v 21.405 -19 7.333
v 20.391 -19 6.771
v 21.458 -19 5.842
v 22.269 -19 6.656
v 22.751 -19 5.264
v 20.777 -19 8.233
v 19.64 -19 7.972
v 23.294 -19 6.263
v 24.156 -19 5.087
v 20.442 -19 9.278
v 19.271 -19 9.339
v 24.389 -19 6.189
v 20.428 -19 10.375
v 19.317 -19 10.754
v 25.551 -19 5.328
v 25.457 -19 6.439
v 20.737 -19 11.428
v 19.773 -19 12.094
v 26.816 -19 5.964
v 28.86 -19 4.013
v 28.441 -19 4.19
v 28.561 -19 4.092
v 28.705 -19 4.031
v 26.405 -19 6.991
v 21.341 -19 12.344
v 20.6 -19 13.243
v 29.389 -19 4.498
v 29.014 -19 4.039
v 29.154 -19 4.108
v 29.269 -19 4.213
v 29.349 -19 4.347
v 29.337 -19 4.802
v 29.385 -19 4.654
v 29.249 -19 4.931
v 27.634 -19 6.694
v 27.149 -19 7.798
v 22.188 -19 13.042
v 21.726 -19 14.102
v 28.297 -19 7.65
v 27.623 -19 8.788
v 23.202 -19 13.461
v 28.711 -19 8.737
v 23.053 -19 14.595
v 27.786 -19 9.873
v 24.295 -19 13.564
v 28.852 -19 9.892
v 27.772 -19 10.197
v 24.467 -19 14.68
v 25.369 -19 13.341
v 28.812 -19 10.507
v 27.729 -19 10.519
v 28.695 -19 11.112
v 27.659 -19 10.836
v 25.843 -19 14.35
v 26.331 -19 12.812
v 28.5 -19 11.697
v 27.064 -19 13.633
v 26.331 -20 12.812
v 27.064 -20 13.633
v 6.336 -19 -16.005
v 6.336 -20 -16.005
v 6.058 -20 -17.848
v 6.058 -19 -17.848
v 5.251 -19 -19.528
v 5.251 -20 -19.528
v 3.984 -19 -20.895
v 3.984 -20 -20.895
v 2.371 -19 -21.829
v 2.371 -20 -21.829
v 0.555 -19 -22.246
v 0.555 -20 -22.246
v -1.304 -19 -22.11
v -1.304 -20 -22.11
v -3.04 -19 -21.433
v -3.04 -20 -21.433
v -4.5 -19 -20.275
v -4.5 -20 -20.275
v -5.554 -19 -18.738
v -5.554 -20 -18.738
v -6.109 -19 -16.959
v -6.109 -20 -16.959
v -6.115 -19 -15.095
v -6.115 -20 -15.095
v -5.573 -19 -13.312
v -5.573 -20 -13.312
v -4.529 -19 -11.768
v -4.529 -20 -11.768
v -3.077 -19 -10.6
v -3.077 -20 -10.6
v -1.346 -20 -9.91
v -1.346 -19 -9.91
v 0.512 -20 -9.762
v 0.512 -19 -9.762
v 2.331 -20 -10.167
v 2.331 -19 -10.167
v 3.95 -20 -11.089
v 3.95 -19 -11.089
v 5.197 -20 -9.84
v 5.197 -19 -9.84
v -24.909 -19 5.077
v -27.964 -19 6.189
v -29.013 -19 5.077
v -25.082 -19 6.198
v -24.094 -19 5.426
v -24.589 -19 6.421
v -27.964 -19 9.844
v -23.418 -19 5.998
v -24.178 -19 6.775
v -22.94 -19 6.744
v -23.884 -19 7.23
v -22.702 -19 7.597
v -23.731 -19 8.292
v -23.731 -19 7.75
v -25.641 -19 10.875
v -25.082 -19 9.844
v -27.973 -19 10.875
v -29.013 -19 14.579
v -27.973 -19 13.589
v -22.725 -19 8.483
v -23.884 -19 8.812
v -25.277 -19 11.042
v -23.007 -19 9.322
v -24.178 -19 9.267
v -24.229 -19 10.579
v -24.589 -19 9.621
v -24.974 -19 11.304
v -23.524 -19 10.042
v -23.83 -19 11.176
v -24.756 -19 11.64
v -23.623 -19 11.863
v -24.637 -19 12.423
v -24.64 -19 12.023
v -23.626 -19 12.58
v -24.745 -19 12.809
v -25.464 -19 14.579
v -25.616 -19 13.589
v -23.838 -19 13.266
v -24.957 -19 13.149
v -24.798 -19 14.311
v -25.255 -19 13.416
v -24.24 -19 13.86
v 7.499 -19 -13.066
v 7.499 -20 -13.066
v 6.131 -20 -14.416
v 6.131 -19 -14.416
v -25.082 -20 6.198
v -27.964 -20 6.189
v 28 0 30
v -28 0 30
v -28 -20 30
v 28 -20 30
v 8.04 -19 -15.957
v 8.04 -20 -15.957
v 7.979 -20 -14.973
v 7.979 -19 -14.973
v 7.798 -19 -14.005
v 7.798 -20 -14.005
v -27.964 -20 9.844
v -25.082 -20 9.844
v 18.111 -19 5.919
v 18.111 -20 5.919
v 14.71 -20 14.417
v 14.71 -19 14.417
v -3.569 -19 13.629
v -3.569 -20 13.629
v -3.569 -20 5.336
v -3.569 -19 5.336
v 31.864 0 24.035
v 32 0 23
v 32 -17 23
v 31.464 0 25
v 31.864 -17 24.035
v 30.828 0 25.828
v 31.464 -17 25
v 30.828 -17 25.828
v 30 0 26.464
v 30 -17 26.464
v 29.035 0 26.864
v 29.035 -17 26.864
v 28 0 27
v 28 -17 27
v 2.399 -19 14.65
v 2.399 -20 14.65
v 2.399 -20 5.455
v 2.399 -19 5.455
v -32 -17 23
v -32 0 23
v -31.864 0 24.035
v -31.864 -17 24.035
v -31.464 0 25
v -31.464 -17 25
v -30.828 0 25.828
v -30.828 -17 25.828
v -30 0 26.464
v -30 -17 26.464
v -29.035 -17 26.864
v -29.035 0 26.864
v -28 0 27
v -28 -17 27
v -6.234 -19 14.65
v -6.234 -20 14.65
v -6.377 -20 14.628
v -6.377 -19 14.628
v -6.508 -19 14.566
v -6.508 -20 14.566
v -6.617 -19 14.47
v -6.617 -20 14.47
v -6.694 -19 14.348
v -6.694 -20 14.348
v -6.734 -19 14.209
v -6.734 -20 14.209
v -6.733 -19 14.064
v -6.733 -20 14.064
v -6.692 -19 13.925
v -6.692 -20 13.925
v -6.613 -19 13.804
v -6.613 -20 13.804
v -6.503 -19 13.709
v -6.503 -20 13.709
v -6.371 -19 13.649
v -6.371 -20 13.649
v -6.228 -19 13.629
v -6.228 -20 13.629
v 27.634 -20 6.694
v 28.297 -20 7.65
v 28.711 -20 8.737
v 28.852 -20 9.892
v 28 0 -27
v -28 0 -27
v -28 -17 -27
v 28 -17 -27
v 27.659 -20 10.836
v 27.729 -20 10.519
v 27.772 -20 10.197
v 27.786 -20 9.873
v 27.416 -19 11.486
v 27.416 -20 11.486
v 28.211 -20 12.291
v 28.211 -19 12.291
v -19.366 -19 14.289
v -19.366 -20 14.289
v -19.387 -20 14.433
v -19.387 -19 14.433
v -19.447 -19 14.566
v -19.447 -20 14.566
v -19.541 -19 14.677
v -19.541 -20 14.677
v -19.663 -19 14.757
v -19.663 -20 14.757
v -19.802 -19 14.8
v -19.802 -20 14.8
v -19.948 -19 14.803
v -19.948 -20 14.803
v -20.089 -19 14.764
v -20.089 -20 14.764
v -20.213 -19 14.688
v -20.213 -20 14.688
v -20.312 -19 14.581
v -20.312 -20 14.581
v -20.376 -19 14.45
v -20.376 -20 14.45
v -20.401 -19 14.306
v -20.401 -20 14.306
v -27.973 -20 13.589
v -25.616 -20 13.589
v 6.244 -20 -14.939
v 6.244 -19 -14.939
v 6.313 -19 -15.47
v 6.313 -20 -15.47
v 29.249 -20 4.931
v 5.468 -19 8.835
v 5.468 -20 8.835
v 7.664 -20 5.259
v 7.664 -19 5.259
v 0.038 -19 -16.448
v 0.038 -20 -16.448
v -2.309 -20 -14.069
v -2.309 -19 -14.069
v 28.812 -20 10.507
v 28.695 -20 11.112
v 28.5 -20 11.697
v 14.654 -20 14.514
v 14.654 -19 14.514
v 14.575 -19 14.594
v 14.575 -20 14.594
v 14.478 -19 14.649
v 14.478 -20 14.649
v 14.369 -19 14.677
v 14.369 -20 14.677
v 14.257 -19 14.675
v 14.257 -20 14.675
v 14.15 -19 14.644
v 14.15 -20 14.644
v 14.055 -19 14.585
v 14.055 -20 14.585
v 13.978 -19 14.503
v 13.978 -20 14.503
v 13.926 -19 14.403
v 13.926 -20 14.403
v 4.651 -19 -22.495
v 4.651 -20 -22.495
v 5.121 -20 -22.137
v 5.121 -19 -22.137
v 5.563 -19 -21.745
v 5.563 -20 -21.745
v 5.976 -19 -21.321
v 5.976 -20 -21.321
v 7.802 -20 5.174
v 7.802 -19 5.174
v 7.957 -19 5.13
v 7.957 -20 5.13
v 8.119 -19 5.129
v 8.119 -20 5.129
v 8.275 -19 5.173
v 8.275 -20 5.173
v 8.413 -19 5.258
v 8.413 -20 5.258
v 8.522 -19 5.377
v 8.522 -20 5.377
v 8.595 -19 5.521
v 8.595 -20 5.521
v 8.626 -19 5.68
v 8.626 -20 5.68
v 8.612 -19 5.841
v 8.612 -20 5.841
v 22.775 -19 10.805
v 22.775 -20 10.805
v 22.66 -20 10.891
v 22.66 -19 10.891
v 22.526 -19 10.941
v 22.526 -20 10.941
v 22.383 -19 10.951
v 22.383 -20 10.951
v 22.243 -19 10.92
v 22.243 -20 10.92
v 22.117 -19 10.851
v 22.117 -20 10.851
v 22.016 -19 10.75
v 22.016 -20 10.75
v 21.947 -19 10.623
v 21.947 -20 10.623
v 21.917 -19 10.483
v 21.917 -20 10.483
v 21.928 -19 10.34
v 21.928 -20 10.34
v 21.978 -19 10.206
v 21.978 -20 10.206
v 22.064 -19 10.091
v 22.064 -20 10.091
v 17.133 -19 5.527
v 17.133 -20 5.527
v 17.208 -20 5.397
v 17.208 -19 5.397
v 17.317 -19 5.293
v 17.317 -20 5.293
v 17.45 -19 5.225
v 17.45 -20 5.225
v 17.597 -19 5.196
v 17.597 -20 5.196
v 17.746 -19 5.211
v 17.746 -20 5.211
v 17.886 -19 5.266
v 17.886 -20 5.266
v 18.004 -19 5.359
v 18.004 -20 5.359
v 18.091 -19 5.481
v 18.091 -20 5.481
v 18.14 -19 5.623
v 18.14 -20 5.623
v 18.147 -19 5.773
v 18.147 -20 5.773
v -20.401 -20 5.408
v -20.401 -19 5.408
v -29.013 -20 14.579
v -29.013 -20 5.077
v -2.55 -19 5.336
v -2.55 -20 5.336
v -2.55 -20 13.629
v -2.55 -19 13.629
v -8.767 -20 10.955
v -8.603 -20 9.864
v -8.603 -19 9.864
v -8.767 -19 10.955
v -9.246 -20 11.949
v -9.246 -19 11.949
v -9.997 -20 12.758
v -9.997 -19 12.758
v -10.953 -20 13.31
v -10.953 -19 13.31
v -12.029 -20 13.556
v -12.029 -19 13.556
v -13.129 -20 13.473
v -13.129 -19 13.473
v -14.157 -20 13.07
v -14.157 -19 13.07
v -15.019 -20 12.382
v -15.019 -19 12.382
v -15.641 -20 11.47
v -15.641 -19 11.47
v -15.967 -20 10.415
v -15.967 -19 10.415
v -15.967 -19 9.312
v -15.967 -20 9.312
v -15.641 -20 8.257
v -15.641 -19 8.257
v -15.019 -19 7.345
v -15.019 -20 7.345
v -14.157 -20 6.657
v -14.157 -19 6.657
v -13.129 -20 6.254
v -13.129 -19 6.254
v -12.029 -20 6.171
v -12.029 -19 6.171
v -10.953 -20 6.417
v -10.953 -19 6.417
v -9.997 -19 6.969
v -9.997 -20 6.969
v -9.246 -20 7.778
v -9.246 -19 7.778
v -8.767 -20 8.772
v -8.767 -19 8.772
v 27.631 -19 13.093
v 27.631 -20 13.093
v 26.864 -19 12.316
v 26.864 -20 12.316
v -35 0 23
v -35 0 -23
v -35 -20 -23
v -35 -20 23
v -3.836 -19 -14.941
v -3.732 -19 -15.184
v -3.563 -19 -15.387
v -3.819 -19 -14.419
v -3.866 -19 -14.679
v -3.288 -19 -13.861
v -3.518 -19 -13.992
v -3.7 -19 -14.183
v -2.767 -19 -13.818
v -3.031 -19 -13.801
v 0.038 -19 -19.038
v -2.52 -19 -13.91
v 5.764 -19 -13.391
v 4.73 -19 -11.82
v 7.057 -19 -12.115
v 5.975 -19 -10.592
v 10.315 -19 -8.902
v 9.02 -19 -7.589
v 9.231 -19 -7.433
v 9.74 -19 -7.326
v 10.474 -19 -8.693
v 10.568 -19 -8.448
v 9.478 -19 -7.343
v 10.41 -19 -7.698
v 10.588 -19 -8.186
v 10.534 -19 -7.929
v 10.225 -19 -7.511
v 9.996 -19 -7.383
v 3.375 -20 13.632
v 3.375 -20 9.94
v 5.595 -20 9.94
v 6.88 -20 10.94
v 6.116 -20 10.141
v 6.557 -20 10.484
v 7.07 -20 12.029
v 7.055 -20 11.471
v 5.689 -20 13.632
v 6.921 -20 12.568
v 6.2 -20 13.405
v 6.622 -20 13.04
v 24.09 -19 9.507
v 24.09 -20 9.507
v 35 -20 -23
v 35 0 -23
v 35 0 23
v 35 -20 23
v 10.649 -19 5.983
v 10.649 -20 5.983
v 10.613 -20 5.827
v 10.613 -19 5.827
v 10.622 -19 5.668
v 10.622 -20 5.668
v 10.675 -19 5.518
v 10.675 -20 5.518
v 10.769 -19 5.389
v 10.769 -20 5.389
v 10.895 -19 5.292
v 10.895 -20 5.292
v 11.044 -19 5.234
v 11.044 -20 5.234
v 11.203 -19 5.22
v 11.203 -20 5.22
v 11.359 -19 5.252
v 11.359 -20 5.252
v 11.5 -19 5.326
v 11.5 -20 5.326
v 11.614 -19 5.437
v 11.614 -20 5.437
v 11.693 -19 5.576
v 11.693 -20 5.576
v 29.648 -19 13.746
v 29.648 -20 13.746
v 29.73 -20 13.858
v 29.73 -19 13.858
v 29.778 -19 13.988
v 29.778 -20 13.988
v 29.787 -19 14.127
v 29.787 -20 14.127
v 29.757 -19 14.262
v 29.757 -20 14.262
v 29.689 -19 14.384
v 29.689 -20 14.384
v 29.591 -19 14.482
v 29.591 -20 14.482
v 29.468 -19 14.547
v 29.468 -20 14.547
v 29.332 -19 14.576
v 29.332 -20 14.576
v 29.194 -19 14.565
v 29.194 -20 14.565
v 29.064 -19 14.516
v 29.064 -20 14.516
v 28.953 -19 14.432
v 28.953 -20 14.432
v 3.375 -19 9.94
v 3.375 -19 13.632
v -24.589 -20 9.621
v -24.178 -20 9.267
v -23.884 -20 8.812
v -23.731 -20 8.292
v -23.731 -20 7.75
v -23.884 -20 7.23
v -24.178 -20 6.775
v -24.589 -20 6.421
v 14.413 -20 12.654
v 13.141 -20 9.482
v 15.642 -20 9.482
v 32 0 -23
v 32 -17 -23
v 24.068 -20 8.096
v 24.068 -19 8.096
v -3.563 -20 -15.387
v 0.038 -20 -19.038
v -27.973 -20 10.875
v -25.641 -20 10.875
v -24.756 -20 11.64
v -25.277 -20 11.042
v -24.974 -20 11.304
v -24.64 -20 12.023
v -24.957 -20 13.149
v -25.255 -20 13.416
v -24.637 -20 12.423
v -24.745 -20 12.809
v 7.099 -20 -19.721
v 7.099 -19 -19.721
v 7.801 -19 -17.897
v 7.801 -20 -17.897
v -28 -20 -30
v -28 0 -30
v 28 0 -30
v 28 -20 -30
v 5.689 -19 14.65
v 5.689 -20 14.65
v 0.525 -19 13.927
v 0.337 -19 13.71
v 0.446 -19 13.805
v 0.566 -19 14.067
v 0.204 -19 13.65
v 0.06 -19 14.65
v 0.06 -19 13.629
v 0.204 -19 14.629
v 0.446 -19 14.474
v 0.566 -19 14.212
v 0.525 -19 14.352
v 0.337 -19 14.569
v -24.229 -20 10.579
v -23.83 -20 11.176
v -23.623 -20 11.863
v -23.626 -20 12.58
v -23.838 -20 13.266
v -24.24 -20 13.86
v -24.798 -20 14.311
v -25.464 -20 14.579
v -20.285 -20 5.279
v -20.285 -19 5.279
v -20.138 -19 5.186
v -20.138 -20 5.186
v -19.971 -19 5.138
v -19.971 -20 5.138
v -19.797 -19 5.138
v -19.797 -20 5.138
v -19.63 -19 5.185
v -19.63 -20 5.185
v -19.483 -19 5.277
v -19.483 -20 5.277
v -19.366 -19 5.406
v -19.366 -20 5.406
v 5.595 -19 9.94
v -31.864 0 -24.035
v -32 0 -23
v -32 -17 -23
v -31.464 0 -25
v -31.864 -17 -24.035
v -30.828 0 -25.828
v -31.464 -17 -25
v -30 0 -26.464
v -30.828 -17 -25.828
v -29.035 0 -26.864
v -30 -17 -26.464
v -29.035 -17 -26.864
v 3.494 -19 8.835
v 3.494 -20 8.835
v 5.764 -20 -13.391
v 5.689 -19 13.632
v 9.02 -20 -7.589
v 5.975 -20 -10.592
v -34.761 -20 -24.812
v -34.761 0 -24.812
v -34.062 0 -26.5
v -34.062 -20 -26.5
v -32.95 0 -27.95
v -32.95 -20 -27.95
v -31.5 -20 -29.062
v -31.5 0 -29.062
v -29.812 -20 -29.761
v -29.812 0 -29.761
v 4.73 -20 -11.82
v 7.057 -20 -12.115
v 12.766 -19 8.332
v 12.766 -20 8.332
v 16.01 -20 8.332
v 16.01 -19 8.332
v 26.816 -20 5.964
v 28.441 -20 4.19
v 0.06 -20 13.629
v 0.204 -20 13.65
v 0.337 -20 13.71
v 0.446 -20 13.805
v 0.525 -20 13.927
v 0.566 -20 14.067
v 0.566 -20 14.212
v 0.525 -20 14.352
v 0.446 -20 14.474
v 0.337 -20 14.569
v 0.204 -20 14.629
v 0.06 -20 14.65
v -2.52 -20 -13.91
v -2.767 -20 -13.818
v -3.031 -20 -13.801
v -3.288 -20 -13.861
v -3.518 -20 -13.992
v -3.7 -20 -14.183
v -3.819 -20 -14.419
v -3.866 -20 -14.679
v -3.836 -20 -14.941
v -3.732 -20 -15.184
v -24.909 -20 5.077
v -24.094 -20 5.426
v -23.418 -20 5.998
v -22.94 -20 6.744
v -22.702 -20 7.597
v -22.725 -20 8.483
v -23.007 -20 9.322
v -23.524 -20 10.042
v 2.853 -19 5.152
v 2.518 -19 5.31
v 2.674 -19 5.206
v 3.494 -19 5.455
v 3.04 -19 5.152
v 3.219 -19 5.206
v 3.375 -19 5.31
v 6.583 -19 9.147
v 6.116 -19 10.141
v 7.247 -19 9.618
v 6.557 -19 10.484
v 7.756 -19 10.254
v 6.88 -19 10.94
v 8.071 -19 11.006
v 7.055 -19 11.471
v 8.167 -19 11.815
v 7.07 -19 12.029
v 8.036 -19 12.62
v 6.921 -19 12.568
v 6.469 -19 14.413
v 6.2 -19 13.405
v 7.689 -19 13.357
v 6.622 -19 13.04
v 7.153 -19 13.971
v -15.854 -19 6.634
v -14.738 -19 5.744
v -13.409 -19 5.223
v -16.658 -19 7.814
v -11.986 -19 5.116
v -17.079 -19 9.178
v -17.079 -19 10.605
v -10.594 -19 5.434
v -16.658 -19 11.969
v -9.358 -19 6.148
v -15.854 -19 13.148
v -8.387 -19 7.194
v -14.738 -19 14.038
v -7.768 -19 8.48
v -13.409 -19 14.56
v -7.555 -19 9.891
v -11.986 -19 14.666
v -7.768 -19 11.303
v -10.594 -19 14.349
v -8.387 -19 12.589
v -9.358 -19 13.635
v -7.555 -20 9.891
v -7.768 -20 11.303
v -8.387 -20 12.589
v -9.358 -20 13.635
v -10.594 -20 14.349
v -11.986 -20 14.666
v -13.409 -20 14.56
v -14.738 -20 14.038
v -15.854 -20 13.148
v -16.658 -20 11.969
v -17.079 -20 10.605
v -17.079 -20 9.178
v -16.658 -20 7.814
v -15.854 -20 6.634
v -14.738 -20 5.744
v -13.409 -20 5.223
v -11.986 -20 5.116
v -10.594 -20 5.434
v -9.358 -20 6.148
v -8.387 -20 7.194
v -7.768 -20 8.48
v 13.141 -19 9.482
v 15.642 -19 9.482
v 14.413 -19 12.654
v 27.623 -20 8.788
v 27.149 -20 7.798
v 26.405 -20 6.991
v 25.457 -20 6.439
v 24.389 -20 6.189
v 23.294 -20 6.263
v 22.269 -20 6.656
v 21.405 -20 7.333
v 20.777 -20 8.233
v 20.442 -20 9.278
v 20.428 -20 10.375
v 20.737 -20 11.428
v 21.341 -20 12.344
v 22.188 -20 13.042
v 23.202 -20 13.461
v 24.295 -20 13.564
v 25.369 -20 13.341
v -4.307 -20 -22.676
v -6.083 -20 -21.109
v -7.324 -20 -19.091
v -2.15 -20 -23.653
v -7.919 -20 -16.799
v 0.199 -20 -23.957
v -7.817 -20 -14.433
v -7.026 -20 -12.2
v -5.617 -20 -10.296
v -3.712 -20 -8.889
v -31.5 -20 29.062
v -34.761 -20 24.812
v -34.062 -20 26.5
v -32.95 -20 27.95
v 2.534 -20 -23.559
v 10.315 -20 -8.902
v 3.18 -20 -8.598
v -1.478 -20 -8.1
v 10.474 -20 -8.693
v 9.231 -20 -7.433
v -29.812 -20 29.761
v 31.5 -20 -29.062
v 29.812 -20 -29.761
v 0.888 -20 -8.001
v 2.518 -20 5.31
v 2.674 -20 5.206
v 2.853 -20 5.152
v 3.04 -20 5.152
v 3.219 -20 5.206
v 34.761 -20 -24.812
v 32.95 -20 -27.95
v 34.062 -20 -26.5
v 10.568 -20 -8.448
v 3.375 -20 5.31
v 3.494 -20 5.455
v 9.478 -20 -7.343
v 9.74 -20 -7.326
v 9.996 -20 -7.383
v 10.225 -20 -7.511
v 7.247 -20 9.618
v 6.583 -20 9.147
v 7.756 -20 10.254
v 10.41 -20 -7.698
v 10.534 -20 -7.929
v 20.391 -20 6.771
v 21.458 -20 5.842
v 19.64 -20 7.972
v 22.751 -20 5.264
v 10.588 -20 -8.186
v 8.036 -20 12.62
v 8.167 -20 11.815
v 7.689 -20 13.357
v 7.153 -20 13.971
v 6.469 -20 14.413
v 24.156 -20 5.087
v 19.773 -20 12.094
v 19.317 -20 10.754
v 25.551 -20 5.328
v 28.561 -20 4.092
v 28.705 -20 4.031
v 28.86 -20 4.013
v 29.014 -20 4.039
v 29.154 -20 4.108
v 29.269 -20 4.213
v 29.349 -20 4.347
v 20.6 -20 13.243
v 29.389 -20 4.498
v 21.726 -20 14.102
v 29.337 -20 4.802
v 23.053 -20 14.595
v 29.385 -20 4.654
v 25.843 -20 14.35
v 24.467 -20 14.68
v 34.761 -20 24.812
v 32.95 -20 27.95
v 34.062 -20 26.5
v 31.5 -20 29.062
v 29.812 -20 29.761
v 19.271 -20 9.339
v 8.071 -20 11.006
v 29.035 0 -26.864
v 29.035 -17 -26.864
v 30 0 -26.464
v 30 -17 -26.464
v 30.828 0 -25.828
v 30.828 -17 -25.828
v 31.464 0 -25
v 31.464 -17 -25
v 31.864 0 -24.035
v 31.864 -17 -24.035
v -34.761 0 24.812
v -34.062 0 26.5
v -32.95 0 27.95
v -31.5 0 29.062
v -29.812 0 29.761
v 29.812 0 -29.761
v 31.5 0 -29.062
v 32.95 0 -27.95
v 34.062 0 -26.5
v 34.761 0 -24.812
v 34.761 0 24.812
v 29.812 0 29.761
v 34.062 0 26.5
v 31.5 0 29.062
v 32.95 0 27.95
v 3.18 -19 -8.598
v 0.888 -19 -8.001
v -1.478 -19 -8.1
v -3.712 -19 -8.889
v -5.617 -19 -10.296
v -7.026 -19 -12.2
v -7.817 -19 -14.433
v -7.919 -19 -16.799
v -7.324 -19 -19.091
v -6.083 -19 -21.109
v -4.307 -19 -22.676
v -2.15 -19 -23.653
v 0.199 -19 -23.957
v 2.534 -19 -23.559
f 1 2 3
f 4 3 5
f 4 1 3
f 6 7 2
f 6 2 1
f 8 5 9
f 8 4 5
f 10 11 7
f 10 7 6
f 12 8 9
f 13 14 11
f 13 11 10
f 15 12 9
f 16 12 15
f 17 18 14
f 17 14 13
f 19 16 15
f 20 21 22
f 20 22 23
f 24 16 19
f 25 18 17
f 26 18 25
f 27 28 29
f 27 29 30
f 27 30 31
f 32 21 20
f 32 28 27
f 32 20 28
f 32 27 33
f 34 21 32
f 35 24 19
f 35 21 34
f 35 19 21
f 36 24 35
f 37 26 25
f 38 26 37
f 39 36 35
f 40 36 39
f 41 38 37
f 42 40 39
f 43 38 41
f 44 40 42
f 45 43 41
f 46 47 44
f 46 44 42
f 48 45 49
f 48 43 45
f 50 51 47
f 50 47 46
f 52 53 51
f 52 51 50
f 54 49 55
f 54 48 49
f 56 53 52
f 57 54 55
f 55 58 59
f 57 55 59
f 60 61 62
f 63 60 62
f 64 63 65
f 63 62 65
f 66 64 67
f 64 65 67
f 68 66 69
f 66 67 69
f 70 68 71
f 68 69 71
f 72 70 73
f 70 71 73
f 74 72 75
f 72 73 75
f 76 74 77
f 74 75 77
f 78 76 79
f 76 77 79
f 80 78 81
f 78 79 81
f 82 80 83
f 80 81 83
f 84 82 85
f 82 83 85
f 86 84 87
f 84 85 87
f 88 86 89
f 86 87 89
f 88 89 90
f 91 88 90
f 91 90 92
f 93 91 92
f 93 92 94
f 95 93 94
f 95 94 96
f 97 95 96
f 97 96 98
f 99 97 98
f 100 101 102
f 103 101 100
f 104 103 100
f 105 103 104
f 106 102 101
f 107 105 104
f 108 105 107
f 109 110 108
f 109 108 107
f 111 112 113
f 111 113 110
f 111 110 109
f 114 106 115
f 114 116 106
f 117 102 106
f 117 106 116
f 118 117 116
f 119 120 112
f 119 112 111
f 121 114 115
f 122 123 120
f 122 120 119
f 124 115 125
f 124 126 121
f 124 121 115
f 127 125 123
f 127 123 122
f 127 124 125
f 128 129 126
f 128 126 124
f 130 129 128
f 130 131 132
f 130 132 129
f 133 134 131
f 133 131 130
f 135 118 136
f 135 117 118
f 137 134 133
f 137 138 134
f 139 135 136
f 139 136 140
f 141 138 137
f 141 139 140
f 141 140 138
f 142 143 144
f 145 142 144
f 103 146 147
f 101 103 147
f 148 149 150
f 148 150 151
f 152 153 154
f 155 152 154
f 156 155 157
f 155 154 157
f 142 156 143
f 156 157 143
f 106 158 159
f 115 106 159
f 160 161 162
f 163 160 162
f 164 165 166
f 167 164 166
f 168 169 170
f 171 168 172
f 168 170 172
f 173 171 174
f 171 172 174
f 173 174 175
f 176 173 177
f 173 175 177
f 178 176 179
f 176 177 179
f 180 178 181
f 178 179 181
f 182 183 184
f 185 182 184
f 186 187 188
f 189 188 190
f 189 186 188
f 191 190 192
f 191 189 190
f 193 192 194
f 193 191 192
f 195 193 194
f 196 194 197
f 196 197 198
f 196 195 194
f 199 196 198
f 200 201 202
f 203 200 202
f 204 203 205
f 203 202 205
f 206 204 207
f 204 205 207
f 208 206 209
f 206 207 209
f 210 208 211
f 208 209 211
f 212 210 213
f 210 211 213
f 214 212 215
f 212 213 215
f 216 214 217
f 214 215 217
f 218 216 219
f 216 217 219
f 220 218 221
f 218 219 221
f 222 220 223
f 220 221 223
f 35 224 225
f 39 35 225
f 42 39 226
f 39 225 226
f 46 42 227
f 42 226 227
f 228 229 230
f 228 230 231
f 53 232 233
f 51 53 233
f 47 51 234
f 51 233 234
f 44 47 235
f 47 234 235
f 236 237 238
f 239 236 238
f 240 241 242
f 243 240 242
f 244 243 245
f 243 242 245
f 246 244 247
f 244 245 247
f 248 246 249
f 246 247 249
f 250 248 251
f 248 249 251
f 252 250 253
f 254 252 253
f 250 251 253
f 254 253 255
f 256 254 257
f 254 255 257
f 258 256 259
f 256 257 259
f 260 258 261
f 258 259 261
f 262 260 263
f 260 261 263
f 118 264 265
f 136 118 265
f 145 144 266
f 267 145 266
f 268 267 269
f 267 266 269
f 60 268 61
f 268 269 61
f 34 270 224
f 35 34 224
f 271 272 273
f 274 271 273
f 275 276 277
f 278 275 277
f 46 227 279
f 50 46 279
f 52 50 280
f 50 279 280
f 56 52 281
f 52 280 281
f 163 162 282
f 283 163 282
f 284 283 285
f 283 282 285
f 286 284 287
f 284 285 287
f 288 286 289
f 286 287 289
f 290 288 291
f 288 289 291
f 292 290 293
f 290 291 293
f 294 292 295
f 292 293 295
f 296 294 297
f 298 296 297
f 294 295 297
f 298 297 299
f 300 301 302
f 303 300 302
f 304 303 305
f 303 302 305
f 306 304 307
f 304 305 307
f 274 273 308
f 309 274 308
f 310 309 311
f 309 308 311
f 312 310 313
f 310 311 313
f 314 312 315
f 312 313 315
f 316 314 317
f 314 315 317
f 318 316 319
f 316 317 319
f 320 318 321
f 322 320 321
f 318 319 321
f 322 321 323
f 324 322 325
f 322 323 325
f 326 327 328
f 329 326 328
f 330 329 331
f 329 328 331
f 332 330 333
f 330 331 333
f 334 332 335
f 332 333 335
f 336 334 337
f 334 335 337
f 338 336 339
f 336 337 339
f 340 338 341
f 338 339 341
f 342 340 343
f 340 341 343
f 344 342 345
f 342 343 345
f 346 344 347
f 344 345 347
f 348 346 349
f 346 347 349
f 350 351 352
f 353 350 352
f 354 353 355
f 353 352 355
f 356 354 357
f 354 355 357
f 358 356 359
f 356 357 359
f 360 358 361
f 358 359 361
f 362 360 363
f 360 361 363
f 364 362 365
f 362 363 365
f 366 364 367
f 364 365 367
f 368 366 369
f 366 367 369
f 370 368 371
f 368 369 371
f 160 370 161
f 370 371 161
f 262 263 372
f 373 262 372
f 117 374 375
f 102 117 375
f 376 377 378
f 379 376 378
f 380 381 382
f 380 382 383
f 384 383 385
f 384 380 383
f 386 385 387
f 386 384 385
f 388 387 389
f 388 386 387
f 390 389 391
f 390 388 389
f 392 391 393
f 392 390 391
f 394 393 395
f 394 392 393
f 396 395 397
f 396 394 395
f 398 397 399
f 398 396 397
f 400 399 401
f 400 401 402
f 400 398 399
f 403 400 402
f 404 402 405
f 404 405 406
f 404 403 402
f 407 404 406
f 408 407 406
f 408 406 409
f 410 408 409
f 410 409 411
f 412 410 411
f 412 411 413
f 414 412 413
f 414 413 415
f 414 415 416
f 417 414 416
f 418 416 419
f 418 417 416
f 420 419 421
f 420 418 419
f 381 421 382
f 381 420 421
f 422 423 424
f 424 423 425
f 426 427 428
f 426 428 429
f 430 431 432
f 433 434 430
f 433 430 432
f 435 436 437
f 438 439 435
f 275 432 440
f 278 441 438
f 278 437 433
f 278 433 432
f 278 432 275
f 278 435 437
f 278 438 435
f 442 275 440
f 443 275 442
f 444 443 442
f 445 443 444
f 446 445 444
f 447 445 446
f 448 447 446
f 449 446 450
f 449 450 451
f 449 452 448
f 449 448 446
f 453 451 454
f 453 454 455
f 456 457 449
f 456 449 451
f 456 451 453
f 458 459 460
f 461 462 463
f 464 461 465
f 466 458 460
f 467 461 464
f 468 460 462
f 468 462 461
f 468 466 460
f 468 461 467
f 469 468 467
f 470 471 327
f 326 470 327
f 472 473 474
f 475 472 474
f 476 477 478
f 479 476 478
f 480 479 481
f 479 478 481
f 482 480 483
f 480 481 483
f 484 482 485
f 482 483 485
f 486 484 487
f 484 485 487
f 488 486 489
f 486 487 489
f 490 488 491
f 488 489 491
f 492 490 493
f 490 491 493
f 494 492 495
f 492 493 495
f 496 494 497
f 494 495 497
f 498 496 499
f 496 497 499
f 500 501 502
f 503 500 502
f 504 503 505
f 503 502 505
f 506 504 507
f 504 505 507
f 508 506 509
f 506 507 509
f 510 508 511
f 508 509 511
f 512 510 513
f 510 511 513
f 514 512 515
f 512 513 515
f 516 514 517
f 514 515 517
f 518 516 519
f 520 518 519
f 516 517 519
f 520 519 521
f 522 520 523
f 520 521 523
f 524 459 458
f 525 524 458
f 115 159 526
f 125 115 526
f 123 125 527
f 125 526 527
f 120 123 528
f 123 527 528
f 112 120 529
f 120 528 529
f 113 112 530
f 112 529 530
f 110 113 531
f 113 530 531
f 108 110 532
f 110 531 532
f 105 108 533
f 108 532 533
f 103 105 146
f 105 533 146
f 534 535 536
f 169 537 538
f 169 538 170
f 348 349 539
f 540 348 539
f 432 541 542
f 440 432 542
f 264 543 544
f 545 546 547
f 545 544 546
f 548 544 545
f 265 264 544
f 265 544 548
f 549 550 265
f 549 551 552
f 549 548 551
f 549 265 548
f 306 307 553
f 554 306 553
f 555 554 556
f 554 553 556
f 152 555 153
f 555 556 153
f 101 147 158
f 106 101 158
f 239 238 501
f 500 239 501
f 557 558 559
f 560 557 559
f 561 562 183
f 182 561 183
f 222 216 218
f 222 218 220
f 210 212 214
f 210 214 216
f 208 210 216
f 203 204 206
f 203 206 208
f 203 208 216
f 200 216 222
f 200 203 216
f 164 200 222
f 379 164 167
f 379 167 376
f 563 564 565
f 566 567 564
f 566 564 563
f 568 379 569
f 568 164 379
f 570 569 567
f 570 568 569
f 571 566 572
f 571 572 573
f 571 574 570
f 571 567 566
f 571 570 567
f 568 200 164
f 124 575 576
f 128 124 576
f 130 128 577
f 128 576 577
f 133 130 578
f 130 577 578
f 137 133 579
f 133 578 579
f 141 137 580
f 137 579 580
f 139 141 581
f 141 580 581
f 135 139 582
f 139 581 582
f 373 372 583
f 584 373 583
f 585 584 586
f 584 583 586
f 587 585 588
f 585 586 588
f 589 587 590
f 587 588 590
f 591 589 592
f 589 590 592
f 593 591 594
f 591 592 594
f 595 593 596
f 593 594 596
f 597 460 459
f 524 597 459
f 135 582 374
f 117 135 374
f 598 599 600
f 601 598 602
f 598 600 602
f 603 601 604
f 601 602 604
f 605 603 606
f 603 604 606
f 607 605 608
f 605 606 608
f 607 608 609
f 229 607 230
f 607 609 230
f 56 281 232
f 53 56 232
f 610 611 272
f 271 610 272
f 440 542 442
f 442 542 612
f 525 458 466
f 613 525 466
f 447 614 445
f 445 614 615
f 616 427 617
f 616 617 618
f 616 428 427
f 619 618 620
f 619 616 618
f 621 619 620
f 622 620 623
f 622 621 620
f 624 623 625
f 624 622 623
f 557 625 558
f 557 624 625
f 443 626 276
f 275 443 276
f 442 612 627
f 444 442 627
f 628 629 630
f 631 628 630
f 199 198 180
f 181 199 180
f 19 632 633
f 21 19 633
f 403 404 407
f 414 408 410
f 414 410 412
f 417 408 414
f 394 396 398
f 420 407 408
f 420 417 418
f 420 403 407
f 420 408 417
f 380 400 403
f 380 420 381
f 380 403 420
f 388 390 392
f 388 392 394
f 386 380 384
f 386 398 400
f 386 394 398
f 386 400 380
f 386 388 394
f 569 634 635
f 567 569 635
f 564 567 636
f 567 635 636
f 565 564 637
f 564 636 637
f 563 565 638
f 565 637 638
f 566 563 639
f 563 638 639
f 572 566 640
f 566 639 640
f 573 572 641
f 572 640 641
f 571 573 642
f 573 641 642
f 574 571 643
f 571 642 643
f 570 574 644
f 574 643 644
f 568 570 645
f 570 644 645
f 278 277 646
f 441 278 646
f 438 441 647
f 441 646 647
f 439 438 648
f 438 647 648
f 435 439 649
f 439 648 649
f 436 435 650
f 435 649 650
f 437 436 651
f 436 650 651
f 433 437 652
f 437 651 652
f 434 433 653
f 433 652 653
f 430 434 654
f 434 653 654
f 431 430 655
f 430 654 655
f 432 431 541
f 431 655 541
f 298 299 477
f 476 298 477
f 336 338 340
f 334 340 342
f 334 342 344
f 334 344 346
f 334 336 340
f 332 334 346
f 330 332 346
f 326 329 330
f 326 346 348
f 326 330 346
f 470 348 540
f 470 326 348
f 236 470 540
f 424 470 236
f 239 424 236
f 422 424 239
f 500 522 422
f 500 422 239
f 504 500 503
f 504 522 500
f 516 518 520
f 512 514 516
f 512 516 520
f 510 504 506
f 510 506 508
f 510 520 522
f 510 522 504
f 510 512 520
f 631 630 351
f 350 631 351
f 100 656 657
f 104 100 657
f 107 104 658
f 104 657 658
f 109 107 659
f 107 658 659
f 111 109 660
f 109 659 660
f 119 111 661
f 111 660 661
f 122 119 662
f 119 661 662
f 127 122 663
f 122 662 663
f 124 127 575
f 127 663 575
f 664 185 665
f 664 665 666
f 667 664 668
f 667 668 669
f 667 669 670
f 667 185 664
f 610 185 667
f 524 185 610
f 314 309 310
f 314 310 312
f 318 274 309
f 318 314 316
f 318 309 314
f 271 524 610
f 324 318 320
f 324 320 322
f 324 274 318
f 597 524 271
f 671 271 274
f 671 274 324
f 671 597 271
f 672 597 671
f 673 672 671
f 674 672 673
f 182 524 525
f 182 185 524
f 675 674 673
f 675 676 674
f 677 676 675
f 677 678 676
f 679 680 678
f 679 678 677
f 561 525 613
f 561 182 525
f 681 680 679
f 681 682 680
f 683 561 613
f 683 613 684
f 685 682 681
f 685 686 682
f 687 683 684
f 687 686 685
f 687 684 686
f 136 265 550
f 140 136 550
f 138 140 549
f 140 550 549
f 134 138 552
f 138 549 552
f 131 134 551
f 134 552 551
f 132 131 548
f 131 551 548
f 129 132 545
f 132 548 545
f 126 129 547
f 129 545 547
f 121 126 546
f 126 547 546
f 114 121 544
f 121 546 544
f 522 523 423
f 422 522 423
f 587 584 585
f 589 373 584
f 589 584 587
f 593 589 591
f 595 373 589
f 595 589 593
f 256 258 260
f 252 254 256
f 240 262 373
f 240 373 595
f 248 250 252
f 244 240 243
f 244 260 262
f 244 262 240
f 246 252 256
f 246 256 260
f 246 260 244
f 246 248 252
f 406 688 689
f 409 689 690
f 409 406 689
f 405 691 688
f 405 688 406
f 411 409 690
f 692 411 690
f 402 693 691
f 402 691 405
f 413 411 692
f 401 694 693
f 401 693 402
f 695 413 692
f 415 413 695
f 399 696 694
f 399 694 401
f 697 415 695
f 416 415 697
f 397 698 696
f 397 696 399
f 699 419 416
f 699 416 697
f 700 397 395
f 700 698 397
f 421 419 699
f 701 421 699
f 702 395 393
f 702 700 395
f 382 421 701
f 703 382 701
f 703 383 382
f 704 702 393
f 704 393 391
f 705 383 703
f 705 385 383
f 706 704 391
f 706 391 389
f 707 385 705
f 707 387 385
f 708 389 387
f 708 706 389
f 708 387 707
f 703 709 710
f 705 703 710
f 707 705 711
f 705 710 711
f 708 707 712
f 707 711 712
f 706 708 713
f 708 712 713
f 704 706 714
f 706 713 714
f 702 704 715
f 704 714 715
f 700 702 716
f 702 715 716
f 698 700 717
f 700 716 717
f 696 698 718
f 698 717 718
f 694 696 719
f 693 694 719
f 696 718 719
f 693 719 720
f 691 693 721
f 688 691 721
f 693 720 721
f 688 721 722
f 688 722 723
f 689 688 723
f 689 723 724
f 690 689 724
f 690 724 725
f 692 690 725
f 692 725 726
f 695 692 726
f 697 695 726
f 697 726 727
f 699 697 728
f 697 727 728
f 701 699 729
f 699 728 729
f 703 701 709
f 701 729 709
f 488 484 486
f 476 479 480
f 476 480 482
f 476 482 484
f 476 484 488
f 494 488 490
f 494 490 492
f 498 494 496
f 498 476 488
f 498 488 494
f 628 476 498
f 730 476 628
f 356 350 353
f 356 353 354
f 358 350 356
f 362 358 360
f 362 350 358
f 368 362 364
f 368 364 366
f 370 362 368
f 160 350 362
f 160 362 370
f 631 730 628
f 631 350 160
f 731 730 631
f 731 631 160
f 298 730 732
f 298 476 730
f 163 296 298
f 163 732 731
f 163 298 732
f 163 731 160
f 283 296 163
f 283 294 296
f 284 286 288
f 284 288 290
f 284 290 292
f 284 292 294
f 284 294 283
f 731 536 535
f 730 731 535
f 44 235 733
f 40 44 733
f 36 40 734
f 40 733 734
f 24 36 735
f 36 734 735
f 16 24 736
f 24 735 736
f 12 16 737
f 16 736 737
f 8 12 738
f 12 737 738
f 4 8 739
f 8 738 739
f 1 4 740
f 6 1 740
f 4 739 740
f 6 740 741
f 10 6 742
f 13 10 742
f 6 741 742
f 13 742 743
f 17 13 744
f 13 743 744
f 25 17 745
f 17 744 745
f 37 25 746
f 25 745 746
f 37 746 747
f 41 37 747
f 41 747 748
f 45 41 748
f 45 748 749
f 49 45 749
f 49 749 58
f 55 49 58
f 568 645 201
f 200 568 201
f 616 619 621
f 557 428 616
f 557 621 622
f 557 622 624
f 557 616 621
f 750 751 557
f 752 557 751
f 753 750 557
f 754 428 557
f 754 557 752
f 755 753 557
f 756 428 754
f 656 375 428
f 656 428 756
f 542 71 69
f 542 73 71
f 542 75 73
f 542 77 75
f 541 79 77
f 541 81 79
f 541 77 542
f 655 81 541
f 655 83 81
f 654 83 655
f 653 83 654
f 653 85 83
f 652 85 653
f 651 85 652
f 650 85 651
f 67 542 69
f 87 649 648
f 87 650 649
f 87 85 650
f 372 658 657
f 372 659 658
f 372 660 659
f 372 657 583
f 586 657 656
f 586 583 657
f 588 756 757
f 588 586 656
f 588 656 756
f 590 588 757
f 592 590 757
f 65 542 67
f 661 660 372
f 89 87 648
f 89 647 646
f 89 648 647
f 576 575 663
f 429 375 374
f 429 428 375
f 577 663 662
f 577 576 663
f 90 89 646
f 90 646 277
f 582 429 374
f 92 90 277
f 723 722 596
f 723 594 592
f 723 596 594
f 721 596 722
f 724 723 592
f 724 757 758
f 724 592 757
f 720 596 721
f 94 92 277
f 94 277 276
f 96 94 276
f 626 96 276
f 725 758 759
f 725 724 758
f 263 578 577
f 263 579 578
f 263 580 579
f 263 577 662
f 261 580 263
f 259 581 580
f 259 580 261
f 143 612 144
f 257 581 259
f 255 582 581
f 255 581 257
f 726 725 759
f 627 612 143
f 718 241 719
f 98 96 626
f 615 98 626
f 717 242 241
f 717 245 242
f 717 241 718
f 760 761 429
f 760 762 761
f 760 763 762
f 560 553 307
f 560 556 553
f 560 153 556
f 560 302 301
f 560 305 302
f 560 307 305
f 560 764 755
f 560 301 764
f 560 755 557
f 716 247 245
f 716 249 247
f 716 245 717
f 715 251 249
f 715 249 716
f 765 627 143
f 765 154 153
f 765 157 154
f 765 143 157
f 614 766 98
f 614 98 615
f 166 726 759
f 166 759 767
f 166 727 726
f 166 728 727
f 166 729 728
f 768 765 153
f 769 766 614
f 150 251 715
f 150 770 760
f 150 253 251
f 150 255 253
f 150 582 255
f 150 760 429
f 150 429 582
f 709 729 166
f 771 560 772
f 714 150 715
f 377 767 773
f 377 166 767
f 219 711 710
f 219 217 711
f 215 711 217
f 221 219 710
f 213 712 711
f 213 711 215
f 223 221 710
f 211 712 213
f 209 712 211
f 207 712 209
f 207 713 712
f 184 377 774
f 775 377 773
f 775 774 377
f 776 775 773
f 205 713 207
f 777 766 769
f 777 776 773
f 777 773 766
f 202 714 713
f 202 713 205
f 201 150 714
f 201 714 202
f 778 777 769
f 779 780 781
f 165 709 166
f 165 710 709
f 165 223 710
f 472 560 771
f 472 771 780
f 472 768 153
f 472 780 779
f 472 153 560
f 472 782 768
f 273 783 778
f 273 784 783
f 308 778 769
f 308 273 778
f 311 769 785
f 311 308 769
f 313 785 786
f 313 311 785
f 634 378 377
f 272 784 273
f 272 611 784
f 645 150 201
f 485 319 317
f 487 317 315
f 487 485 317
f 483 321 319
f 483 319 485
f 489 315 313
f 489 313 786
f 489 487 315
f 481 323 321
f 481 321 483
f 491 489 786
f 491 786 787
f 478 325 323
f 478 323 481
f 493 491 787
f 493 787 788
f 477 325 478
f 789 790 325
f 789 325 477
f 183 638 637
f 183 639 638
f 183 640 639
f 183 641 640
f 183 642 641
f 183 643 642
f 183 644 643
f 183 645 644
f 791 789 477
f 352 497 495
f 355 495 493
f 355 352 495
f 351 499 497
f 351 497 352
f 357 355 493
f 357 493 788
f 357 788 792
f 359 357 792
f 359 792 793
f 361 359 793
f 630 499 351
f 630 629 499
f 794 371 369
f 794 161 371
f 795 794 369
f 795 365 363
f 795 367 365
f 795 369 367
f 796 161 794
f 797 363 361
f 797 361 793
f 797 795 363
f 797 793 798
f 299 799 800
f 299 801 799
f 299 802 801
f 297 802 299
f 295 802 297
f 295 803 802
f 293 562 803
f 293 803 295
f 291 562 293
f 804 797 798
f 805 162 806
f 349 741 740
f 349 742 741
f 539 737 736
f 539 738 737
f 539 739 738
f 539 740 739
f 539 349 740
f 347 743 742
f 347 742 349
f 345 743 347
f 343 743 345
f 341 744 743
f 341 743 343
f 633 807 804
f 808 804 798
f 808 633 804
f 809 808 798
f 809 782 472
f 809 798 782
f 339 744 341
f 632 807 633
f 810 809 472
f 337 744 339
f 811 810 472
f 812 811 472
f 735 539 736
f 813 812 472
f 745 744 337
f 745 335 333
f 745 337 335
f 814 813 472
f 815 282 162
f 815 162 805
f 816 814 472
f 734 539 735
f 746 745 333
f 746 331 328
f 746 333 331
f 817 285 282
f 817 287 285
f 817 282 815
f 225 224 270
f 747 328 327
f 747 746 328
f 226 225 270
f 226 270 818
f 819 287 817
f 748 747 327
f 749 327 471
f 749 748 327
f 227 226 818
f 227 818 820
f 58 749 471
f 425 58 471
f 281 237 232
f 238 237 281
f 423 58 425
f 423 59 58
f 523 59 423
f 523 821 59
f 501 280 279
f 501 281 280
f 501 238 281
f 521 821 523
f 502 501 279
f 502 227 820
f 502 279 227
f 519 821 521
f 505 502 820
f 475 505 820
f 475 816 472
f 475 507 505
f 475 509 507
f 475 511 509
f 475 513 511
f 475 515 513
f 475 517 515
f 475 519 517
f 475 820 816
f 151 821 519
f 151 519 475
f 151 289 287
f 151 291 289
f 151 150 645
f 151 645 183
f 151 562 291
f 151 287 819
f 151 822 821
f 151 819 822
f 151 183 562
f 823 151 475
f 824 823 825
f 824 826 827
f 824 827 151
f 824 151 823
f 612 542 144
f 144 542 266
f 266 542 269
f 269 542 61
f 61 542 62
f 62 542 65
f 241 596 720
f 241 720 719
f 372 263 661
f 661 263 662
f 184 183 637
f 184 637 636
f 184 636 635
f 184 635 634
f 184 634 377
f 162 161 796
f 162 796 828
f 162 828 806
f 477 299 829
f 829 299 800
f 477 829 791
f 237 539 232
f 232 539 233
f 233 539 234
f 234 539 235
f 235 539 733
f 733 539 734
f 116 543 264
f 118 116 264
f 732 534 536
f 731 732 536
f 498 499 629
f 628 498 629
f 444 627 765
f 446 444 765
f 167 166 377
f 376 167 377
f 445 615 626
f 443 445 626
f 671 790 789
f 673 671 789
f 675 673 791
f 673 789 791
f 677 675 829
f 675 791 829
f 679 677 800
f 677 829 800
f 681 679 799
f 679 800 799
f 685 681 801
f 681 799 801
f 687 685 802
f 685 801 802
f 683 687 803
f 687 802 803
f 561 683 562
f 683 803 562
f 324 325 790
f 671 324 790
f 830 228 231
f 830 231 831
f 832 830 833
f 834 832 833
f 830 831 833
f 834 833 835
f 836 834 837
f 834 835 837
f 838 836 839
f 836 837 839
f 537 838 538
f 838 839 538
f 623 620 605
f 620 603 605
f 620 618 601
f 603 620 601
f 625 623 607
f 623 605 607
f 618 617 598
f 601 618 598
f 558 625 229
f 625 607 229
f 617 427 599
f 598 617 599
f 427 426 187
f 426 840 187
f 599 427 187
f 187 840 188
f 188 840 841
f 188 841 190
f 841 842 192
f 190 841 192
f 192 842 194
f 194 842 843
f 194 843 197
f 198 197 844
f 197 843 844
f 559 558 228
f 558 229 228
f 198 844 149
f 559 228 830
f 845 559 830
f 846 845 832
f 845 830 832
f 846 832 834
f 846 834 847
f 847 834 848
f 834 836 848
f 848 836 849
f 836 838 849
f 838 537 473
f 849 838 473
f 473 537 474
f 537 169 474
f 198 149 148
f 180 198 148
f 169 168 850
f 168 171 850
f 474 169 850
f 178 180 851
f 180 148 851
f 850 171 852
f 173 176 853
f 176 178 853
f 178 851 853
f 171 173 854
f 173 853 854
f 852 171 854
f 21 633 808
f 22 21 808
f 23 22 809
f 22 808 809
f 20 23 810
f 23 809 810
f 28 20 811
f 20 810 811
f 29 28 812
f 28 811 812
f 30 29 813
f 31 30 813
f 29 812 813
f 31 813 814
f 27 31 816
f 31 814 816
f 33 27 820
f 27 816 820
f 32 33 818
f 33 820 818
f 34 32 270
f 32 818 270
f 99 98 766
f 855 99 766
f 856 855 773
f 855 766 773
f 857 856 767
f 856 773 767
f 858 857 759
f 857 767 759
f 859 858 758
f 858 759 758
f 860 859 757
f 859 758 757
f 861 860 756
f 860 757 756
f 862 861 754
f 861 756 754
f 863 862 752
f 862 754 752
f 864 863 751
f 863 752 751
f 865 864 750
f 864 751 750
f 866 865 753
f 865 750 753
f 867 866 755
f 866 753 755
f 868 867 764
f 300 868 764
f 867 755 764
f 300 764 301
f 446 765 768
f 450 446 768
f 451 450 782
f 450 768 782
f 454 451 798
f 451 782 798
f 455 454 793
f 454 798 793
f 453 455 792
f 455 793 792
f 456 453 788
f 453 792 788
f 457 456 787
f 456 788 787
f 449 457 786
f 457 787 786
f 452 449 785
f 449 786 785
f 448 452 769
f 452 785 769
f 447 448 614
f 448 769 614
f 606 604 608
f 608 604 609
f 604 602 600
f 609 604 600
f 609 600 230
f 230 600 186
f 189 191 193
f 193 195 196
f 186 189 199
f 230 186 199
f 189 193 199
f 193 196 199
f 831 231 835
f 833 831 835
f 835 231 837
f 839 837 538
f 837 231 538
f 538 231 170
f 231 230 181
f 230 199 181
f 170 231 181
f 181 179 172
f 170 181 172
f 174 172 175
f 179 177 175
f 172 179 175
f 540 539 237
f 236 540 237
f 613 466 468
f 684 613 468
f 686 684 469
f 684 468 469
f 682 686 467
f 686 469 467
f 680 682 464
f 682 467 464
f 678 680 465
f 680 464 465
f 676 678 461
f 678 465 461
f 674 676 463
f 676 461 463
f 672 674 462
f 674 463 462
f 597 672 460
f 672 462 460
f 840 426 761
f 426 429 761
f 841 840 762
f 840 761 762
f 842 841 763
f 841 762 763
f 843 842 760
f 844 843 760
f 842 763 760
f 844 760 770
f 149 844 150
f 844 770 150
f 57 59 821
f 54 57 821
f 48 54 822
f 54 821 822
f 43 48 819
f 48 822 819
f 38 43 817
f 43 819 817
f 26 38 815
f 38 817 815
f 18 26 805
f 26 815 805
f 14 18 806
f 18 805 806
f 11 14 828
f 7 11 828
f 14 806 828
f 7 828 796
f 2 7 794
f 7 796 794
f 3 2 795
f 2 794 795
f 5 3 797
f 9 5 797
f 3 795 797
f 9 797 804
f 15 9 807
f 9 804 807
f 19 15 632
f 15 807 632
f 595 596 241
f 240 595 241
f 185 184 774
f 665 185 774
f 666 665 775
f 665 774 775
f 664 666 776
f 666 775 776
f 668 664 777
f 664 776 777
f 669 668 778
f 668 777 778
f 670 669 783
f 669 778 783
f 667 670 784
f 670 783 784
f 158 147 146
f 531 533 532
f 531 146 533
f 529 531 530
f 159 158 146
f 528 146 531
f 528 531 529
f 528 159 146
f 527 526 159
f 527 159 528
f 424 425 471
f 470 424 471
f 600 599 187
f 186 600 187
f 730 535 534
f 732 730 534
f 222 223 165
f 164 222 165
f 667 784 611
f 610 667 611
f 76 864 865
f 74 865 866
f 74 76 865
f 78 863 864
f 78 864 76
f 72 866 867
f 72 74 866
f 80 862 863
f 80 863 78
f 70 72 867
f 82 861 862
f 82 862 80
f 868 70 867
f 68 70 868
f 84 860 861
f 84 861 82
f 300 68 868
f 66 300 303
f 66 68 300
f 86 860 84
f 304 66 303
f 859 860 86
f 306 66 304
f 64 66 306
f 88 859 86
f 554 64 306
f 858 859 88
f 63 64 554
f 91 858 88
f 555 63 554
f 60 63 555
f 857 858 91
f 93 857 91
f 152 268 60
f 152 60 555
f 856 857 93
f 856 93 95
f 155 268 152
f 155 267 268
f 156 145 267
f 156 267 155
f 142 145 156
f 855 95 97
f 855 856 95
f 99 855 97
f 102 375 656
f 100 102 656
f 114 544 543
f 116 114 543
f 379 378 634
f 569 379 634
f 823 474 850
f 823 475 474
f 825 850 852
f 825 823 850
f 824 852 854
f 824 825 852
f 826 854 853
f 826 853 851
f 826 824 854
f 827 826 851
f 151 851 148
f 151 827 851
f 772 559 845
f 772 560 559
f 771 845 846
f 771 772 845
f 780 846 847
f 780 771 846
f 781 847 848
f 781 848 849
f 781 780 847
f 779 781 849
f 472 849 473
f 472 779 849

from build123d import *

# Parameters (mm, degrees)
F0_W     = 70
F0_H     = 60
F1_DEPTH = 20
F2_R     = 7
F3_T     = -3
F4_R     = 4.7885075057
F4_R_2   = 3.7026235456
F5_DEPTH = 1


with BuildPart() as f1:
    # F0 (on Front) → F1 (new body)
    with BuildSketch(Plane.XZ):
        Rectangle(F0_W, F0_H)
    extrude(amount=F1_DEPTH)

    # F2
    f2_edges = [f1.edges().sort_by_distance(p)[0] for p in [
        (35, -10, -30),
        (-35, -10, -30),
        (35, -10, 30),
        (-35, -10, 30),
    ]]
    fillet(f2_edges, radius=F2_R)

    # F3
    f3_openings = [f1.faces().sort_by_distance(p)[0] for p in [
        (0, 0, 0),
    ]]
    offset(amount=F3_T, openings=f3_openings)

    # F4 (on face) → F5 (cut)
    with BuildSketch(Plane.XZ.offset(20)):
        with BuildLine():
            ThreePointArc((5.9756954083, -21.3208798361), (7.5060376285, -18.8306109679), (8.0398977368, -15.9568712908))
            ThreePointArc((8.0398977368, -15.9568712908), (7.9036150749, -14.4863732956), (7.4994094473, -13.0659666184))
            Line((7.4994094473, -13.0659666184), (6.1305917901, -14.4159711191))
            ThreePointArc((6.1305917901, -14.4159711191), (6.2842749217, -15.2041179655), (6.3357852508, -16.0054547502))
            ThreePointArc((6.3357852508, -16.0054547502), (-5.5540754685, -18.7377869694), (3.9501702088, -11.0890131208))
            Line((3.9501702088, -11.0890131208), (5.196705387, -9.840010404))
            ThreePointArc((5.196705387, -9.840010404), (-7.9557042611, -15.6118703464), (4.6505361801, -22.4953976897))
            ThreePointArc((4.6505361801, -22.4953976897), (5.3457061154, -21.9449090553), (5.9756954083, -21.3208798361))
        make_face()
        with BuildLine():
            Line((0.0383761635, -19.0379637991), (5.7637177193, -13.3913118671))
            ThreePointArc((5.7637177193, -13.3913118671), (5.3063853455, -12.5665425426), (4.7303228045, -11.8198503118))
            Line((4.7303228045, -11.8198503118), (0.0383761635, -16.4483864674))
            Line((0.0383761635, -16.4483864674), (-2.3087403007, -14.0691147408))
            ThreePointArc((-2.3087403007, -14.0691147408), (-3.6156147651, -14.0808212911), (-3.5627264086, -15.386677612))
            Line((-3.5627264086, -15.386677612), (0.0383761635, -19.0379637991))
        make_face()
        with BuildLine():
            Line((5.7637177193, -13.3913118671), (7.0574382874, -12.1153723141))
            ThreePointArc((7.0574382874, -12.1153723141), (6.5608204438, -11.3219960932), (5.9749529426, -10.5920410388))
            Line((5.9749529426, -10.5920410388), (4.7303228045, -11.8198503118))
            ThreePointArc((4.7303228045, -11.8198503118), (5.3063853455, -12.5665425426), (5.7637177193, -13.3913118671))
        make_face()
        with BuildLine():
            ThreePointArc((5.9749529426, -10.5920410388), (6.5608204438, -11.3219960932), (7.0574382874, -12.1153723141))
            Line((7.0574382874, -12.1153723141), (10.3152280376, -8.9023579275))
            ThreePointArc((10.3152280376, -8.9023579275), (10.3242561937, -7.5976353085), (9.0195335747, -7.5886071525))
            Line((9.0195335747, -7.5886071525), (5.9749529426, -10.5920410388))
        make_face()
        with BuildLine():
            Line((-25.463836038, 14.5788419077), (-29.0132504877, 14.5788419077))
            Line((-29.0132504877, 14.5788419077), (-29.0132504877, 5.0767470373))
            Line((-29.0132504877, 5.0767470373), (-24.9086179807, 5.0767470373))
            ThreePointArc((-24.9086179807, 5.0767470373), (-22.7022924412, 7.5970867281), (-24.2285804935, 10.5787690258))
            ThreePointArc((-24.2285804935, 10.5787690258), (-23.7062839611, 12.9308235072), (-25.463836038, 14.5788419077))
        make_face()
        with BuildLine():
            Line((-27.9734000776, 10.8749483858), (-27.9734000776, 13.5894283968))
            Line((-27.9734000776, 13.5894283968), (-25.6162118383, 13.5894283968))
            ThreePointArc((-25.6162118383, 13.5894283968), (-24.6244842165, 12.2231458353), (-25.6406610471, 10.8749483858))
            Line((-25.6406610471, 10.8749483858), (-27.9734000776, 10.8749483858))
        make_face(mode=Mode.SUBTRACT)
        with BuildLine():
            Line((-27.9640843056, 9.8444300713), (-25.0821946304, 9.8444300713))
            ThreePointArc((-25.0821946304, 9.8444300713), (-23.7118512956, 8.0211258), (-25.0821946304, 6.1978215287))
            Line((-25.0821946304, 6.1978215287), (-27.9640843056, 6.188870993))
            Line((-27.9640843056, 6.188870993), (-27.9640843056, 9.8444300713))
        make_face(mode=Mode.SUBTRACT)
        with BuildLine():
            ThreePointArc((-19.3660976033, 14.2887552617), (-19.8752782584, 14.8065162395), (-20.40147499, 14.30605808))
            Line((-20.40147499, 14.30605808), (-20.40147499, 5.4078511567))
            ThreePointArc((-20.40147499, 5.4078511567), (-19.884282799, 5.1317819915), (-19.3660976033, 5.405982738))
            Line((-19.3660976033, 5.405982738), (-19.3660976033, 14.2887552617))
        make_face()
        with Locations((-12.3437182241, 9.891309084)):
            Circle(F4_R)
        with Locations((-12.3052396193, 9.8635797819)):
            Circle(F4_R_2, mode=Mode.SUBTRACT)
        Polygon((0.060495557, 14.6499899539), (-6.2339946938, 14.6499899539), (-6.2279876776, 13.6288518889), (-3.5691043968, 13.6288518889), (-3.5691043968, 5.3356449452), (-2.5498712742, 5.3356449452), (-2.5498712742, 13.6288518889), (0.060495557, 13.6288518889), align=None)
        with BuildLine():
            ThreePointArc((0.060495557, 13.6288518889), (0.5710645895, 14.1394209214), (0.060495557, 14.6499899539))
            Line((0.060495557, 14.6499899539), (0.060495557, 13.6288518889))
        make_face()
        with BuildLine():
            Line((-6.2279876776, 13.6288518889), (-6.2339946938, 14.6499899539))
            ThreePointArc((-6.2339946938, 14.6499899539), (-6.7385655444, 14.13643503), (-6.2279876776, 13.6288518889))
        make_face()
        with BuildLine():
            Line((5.68894728, 14.6499899539), (2.3992179348, 14.6499899539))
            Line((2.3992179348, 14.6499899539), (2.3992179348, 5.4546332436))
            ThreePointArc((2.3992179348, 5.4546332436), (2.9464930191, 5.1446017563), (3.4937681035, 5.4546332436))
            Line((3.4937681035, 5.4546332436), (3.4937681035, 8.8353623544))
            Line((3.4937681035, 8.8353623544), (5.4684750956, 8.8353623544))
            Line((5.4684750956, 8.8353623544), (7.6643496496, 5.2591634276))
            ThreePointArc((7.6643496496, 5.2591634276), (8.3467179976, 5.2108037756), (8.6122971182, 5.8412266091))
            Line((8.6122971182, 5.8412266091), (6.5826675849, 9.1466790748))
            ThreePointArc((6.5826675849, 9.1466790748), (8.1293427353, 12.2220783511), (5.68894728, 14.6499899539))
        make_face()
        with BuildLine():
            ThreePointArc((5.68894728, 13.6319459919), (7.0831009819, 11.7494924749), (5.5949211536, 9.9404549997))
            Line((5.5949211536, 9.9404549997), (3.3746365671, 9.9404549997))
            Line((3.3746365671, 9.9404549997), (3.3746365671, 13.6319459919))
            Line((3.3746365671, 13.6319459919), (5.68894728, 13.6319459919))
        make_face(mode=Mode.SUBTRACT)
        with BuildLine():
            ThreePointArc((14.7096056189, 14.4168665306), (14.3134062852, 14.6801129854), (13.9264534318, 14.4034541752))
            Line((13.9264534318, 14.4034541752), (10.6487381189, 5.9825136642))
            ThreePointArc((10.6487381189, 5.9825136642), (10.9675570687, 5.2573357806), (11.6927349523, 5.5761547304))
            Line((11.6927349523, 5.5761547304), (12.7655428348, 8.3323585177))
            Line((12.7655428348, 8.3323585177), (16.0099739306, 8.3323585177))
            Line((16.0099739306, 8.3323585177), (17.1330149852, 5.5268825081))
            ThreePointArc((17.1330149852, 5.5268825081), (17.8181026735, 5.2334854183), (18.1114997633, 5.9185731066))
            Line((18.1114997633, 5.9185731066), (14.7096056189, 14.4168665306))
        make_face()
        Polygon((13.1405137187, 9.48174586), (14.4126430381, 12.6535973069), (15.6418385154, 9.48174586), align=None, mode=Mode.SUBTRACT)
        with BuildLine():
            ThreePointArc((27.6586074546, 10.8364686124), (27.7543057203, 10.3589358747), (27.7863908123, 9.8729665129))
            ThreePointArc((27.7863908123, 9.8729665129), (20.7773970324, 8.2330148821), (26.3312045231, 12.8123879303))
            Line((26.3312045231, 12.8123879303), (27.0641849046, 13.6325057938))
            ThreePointArc((27.0641849046, 13.6325057938), (19.2418374627, 10.0479724553), (26.81568619, 5.9644918061))
            ThreePointArc((26.81568619, 5.9644918061), (27.2455005085, 6.3059753785), (27.6335724386, 6.6942427552))
            ThreePointArc((27.6335724386, 6.6942427552), (28.5370532464, 8.1811527366), (28.851969289, 9.8922946796))
            ThreePointArc((28.851969289, 9.8922946796), (28.7631907726, 10.8118138528), (28.5001349107, 11.6973638223))
            Line((28.5001349107, 11.6973638223), (27.6586074546, 10.8364686124))
        make_face()
        with BuildLine():
            Line((24.0681641205, 8.0956717688), (27.4159314963, 11.4858697823))
            ThreePointArc((27.4159314963, 11.4858697823), (27.1680184196, 11.9196861576), (26.8638629672, 12.316103869))
            Line((26.8638629672, 12.316103869), (24.0900374708, 9.5071220515))
            Line((24.0900374708, 9.5071220515), (22.775273925, 10.8054304358))
            ThreePointArc((22.775273925, 10.8054304358), (22.0626570945, 10.8039400184), (22.0641475119, 10.0913231879))
            Line((22.0641475119, 10.0913231879), (24.0681641205, 8.0956717688))
        make_face()
        with BuildLine():
            ThreePointArc((27.6335724386, 6.6942427552), (27.2455005085, 6.3059753785), (26.81568619, 5.9644918061))
            Line((26.81568619, 5.9644918061), (28.4407067429, 4.1904454021))
            ThreePointArc((28.4407067429, 4.1904454021), (29.214969102, 4.1564992903), (29.2489152138, 4.9307616493))
            Line((29.2489152138, 4.9307616493), (27.6335724386, 6.6942427552))
        make_face()
        with BuildLine():
            ThreePointArc((27.6311249444, 13.0930903614), (27.9416464389, 12.7068871234), (28.2107508353, 12.2907629071))
            Line((28.2107508353, 12.2907629071), (29.647856175, 13.7460825638))
            ThreePointArc((29.647856175, 13.7460825638), (29.6435095117, 14.4363306609), (28.9532614146, 14.4319839976))
            Line((28.9532614146, 14.4319839976), (27.6311249444, 13.0930903614))
        make_face()
        with BuildLine():
            ThreePointArc((26.8638629672, 12.316103869), (27.1680184196, 11.9196861576), (27.4159314963, 11.4858697823))
            Line((27.4159314963, 11.4858697823), (28.2107508353, 12.2907629071))
            ThreePointArc((28.2107508353, 12.2907629071), (27.9416464389, 12.7068871234), (27.6311249444, 13.0930903614))
            Line((27.6311249444, 13.0930903614), (26.8638629672, 12.316103869))
        make_face()
    extrude(amount=-F5_DEPTH, mode=Mode.SUBTRACT)


solid = f1.part
